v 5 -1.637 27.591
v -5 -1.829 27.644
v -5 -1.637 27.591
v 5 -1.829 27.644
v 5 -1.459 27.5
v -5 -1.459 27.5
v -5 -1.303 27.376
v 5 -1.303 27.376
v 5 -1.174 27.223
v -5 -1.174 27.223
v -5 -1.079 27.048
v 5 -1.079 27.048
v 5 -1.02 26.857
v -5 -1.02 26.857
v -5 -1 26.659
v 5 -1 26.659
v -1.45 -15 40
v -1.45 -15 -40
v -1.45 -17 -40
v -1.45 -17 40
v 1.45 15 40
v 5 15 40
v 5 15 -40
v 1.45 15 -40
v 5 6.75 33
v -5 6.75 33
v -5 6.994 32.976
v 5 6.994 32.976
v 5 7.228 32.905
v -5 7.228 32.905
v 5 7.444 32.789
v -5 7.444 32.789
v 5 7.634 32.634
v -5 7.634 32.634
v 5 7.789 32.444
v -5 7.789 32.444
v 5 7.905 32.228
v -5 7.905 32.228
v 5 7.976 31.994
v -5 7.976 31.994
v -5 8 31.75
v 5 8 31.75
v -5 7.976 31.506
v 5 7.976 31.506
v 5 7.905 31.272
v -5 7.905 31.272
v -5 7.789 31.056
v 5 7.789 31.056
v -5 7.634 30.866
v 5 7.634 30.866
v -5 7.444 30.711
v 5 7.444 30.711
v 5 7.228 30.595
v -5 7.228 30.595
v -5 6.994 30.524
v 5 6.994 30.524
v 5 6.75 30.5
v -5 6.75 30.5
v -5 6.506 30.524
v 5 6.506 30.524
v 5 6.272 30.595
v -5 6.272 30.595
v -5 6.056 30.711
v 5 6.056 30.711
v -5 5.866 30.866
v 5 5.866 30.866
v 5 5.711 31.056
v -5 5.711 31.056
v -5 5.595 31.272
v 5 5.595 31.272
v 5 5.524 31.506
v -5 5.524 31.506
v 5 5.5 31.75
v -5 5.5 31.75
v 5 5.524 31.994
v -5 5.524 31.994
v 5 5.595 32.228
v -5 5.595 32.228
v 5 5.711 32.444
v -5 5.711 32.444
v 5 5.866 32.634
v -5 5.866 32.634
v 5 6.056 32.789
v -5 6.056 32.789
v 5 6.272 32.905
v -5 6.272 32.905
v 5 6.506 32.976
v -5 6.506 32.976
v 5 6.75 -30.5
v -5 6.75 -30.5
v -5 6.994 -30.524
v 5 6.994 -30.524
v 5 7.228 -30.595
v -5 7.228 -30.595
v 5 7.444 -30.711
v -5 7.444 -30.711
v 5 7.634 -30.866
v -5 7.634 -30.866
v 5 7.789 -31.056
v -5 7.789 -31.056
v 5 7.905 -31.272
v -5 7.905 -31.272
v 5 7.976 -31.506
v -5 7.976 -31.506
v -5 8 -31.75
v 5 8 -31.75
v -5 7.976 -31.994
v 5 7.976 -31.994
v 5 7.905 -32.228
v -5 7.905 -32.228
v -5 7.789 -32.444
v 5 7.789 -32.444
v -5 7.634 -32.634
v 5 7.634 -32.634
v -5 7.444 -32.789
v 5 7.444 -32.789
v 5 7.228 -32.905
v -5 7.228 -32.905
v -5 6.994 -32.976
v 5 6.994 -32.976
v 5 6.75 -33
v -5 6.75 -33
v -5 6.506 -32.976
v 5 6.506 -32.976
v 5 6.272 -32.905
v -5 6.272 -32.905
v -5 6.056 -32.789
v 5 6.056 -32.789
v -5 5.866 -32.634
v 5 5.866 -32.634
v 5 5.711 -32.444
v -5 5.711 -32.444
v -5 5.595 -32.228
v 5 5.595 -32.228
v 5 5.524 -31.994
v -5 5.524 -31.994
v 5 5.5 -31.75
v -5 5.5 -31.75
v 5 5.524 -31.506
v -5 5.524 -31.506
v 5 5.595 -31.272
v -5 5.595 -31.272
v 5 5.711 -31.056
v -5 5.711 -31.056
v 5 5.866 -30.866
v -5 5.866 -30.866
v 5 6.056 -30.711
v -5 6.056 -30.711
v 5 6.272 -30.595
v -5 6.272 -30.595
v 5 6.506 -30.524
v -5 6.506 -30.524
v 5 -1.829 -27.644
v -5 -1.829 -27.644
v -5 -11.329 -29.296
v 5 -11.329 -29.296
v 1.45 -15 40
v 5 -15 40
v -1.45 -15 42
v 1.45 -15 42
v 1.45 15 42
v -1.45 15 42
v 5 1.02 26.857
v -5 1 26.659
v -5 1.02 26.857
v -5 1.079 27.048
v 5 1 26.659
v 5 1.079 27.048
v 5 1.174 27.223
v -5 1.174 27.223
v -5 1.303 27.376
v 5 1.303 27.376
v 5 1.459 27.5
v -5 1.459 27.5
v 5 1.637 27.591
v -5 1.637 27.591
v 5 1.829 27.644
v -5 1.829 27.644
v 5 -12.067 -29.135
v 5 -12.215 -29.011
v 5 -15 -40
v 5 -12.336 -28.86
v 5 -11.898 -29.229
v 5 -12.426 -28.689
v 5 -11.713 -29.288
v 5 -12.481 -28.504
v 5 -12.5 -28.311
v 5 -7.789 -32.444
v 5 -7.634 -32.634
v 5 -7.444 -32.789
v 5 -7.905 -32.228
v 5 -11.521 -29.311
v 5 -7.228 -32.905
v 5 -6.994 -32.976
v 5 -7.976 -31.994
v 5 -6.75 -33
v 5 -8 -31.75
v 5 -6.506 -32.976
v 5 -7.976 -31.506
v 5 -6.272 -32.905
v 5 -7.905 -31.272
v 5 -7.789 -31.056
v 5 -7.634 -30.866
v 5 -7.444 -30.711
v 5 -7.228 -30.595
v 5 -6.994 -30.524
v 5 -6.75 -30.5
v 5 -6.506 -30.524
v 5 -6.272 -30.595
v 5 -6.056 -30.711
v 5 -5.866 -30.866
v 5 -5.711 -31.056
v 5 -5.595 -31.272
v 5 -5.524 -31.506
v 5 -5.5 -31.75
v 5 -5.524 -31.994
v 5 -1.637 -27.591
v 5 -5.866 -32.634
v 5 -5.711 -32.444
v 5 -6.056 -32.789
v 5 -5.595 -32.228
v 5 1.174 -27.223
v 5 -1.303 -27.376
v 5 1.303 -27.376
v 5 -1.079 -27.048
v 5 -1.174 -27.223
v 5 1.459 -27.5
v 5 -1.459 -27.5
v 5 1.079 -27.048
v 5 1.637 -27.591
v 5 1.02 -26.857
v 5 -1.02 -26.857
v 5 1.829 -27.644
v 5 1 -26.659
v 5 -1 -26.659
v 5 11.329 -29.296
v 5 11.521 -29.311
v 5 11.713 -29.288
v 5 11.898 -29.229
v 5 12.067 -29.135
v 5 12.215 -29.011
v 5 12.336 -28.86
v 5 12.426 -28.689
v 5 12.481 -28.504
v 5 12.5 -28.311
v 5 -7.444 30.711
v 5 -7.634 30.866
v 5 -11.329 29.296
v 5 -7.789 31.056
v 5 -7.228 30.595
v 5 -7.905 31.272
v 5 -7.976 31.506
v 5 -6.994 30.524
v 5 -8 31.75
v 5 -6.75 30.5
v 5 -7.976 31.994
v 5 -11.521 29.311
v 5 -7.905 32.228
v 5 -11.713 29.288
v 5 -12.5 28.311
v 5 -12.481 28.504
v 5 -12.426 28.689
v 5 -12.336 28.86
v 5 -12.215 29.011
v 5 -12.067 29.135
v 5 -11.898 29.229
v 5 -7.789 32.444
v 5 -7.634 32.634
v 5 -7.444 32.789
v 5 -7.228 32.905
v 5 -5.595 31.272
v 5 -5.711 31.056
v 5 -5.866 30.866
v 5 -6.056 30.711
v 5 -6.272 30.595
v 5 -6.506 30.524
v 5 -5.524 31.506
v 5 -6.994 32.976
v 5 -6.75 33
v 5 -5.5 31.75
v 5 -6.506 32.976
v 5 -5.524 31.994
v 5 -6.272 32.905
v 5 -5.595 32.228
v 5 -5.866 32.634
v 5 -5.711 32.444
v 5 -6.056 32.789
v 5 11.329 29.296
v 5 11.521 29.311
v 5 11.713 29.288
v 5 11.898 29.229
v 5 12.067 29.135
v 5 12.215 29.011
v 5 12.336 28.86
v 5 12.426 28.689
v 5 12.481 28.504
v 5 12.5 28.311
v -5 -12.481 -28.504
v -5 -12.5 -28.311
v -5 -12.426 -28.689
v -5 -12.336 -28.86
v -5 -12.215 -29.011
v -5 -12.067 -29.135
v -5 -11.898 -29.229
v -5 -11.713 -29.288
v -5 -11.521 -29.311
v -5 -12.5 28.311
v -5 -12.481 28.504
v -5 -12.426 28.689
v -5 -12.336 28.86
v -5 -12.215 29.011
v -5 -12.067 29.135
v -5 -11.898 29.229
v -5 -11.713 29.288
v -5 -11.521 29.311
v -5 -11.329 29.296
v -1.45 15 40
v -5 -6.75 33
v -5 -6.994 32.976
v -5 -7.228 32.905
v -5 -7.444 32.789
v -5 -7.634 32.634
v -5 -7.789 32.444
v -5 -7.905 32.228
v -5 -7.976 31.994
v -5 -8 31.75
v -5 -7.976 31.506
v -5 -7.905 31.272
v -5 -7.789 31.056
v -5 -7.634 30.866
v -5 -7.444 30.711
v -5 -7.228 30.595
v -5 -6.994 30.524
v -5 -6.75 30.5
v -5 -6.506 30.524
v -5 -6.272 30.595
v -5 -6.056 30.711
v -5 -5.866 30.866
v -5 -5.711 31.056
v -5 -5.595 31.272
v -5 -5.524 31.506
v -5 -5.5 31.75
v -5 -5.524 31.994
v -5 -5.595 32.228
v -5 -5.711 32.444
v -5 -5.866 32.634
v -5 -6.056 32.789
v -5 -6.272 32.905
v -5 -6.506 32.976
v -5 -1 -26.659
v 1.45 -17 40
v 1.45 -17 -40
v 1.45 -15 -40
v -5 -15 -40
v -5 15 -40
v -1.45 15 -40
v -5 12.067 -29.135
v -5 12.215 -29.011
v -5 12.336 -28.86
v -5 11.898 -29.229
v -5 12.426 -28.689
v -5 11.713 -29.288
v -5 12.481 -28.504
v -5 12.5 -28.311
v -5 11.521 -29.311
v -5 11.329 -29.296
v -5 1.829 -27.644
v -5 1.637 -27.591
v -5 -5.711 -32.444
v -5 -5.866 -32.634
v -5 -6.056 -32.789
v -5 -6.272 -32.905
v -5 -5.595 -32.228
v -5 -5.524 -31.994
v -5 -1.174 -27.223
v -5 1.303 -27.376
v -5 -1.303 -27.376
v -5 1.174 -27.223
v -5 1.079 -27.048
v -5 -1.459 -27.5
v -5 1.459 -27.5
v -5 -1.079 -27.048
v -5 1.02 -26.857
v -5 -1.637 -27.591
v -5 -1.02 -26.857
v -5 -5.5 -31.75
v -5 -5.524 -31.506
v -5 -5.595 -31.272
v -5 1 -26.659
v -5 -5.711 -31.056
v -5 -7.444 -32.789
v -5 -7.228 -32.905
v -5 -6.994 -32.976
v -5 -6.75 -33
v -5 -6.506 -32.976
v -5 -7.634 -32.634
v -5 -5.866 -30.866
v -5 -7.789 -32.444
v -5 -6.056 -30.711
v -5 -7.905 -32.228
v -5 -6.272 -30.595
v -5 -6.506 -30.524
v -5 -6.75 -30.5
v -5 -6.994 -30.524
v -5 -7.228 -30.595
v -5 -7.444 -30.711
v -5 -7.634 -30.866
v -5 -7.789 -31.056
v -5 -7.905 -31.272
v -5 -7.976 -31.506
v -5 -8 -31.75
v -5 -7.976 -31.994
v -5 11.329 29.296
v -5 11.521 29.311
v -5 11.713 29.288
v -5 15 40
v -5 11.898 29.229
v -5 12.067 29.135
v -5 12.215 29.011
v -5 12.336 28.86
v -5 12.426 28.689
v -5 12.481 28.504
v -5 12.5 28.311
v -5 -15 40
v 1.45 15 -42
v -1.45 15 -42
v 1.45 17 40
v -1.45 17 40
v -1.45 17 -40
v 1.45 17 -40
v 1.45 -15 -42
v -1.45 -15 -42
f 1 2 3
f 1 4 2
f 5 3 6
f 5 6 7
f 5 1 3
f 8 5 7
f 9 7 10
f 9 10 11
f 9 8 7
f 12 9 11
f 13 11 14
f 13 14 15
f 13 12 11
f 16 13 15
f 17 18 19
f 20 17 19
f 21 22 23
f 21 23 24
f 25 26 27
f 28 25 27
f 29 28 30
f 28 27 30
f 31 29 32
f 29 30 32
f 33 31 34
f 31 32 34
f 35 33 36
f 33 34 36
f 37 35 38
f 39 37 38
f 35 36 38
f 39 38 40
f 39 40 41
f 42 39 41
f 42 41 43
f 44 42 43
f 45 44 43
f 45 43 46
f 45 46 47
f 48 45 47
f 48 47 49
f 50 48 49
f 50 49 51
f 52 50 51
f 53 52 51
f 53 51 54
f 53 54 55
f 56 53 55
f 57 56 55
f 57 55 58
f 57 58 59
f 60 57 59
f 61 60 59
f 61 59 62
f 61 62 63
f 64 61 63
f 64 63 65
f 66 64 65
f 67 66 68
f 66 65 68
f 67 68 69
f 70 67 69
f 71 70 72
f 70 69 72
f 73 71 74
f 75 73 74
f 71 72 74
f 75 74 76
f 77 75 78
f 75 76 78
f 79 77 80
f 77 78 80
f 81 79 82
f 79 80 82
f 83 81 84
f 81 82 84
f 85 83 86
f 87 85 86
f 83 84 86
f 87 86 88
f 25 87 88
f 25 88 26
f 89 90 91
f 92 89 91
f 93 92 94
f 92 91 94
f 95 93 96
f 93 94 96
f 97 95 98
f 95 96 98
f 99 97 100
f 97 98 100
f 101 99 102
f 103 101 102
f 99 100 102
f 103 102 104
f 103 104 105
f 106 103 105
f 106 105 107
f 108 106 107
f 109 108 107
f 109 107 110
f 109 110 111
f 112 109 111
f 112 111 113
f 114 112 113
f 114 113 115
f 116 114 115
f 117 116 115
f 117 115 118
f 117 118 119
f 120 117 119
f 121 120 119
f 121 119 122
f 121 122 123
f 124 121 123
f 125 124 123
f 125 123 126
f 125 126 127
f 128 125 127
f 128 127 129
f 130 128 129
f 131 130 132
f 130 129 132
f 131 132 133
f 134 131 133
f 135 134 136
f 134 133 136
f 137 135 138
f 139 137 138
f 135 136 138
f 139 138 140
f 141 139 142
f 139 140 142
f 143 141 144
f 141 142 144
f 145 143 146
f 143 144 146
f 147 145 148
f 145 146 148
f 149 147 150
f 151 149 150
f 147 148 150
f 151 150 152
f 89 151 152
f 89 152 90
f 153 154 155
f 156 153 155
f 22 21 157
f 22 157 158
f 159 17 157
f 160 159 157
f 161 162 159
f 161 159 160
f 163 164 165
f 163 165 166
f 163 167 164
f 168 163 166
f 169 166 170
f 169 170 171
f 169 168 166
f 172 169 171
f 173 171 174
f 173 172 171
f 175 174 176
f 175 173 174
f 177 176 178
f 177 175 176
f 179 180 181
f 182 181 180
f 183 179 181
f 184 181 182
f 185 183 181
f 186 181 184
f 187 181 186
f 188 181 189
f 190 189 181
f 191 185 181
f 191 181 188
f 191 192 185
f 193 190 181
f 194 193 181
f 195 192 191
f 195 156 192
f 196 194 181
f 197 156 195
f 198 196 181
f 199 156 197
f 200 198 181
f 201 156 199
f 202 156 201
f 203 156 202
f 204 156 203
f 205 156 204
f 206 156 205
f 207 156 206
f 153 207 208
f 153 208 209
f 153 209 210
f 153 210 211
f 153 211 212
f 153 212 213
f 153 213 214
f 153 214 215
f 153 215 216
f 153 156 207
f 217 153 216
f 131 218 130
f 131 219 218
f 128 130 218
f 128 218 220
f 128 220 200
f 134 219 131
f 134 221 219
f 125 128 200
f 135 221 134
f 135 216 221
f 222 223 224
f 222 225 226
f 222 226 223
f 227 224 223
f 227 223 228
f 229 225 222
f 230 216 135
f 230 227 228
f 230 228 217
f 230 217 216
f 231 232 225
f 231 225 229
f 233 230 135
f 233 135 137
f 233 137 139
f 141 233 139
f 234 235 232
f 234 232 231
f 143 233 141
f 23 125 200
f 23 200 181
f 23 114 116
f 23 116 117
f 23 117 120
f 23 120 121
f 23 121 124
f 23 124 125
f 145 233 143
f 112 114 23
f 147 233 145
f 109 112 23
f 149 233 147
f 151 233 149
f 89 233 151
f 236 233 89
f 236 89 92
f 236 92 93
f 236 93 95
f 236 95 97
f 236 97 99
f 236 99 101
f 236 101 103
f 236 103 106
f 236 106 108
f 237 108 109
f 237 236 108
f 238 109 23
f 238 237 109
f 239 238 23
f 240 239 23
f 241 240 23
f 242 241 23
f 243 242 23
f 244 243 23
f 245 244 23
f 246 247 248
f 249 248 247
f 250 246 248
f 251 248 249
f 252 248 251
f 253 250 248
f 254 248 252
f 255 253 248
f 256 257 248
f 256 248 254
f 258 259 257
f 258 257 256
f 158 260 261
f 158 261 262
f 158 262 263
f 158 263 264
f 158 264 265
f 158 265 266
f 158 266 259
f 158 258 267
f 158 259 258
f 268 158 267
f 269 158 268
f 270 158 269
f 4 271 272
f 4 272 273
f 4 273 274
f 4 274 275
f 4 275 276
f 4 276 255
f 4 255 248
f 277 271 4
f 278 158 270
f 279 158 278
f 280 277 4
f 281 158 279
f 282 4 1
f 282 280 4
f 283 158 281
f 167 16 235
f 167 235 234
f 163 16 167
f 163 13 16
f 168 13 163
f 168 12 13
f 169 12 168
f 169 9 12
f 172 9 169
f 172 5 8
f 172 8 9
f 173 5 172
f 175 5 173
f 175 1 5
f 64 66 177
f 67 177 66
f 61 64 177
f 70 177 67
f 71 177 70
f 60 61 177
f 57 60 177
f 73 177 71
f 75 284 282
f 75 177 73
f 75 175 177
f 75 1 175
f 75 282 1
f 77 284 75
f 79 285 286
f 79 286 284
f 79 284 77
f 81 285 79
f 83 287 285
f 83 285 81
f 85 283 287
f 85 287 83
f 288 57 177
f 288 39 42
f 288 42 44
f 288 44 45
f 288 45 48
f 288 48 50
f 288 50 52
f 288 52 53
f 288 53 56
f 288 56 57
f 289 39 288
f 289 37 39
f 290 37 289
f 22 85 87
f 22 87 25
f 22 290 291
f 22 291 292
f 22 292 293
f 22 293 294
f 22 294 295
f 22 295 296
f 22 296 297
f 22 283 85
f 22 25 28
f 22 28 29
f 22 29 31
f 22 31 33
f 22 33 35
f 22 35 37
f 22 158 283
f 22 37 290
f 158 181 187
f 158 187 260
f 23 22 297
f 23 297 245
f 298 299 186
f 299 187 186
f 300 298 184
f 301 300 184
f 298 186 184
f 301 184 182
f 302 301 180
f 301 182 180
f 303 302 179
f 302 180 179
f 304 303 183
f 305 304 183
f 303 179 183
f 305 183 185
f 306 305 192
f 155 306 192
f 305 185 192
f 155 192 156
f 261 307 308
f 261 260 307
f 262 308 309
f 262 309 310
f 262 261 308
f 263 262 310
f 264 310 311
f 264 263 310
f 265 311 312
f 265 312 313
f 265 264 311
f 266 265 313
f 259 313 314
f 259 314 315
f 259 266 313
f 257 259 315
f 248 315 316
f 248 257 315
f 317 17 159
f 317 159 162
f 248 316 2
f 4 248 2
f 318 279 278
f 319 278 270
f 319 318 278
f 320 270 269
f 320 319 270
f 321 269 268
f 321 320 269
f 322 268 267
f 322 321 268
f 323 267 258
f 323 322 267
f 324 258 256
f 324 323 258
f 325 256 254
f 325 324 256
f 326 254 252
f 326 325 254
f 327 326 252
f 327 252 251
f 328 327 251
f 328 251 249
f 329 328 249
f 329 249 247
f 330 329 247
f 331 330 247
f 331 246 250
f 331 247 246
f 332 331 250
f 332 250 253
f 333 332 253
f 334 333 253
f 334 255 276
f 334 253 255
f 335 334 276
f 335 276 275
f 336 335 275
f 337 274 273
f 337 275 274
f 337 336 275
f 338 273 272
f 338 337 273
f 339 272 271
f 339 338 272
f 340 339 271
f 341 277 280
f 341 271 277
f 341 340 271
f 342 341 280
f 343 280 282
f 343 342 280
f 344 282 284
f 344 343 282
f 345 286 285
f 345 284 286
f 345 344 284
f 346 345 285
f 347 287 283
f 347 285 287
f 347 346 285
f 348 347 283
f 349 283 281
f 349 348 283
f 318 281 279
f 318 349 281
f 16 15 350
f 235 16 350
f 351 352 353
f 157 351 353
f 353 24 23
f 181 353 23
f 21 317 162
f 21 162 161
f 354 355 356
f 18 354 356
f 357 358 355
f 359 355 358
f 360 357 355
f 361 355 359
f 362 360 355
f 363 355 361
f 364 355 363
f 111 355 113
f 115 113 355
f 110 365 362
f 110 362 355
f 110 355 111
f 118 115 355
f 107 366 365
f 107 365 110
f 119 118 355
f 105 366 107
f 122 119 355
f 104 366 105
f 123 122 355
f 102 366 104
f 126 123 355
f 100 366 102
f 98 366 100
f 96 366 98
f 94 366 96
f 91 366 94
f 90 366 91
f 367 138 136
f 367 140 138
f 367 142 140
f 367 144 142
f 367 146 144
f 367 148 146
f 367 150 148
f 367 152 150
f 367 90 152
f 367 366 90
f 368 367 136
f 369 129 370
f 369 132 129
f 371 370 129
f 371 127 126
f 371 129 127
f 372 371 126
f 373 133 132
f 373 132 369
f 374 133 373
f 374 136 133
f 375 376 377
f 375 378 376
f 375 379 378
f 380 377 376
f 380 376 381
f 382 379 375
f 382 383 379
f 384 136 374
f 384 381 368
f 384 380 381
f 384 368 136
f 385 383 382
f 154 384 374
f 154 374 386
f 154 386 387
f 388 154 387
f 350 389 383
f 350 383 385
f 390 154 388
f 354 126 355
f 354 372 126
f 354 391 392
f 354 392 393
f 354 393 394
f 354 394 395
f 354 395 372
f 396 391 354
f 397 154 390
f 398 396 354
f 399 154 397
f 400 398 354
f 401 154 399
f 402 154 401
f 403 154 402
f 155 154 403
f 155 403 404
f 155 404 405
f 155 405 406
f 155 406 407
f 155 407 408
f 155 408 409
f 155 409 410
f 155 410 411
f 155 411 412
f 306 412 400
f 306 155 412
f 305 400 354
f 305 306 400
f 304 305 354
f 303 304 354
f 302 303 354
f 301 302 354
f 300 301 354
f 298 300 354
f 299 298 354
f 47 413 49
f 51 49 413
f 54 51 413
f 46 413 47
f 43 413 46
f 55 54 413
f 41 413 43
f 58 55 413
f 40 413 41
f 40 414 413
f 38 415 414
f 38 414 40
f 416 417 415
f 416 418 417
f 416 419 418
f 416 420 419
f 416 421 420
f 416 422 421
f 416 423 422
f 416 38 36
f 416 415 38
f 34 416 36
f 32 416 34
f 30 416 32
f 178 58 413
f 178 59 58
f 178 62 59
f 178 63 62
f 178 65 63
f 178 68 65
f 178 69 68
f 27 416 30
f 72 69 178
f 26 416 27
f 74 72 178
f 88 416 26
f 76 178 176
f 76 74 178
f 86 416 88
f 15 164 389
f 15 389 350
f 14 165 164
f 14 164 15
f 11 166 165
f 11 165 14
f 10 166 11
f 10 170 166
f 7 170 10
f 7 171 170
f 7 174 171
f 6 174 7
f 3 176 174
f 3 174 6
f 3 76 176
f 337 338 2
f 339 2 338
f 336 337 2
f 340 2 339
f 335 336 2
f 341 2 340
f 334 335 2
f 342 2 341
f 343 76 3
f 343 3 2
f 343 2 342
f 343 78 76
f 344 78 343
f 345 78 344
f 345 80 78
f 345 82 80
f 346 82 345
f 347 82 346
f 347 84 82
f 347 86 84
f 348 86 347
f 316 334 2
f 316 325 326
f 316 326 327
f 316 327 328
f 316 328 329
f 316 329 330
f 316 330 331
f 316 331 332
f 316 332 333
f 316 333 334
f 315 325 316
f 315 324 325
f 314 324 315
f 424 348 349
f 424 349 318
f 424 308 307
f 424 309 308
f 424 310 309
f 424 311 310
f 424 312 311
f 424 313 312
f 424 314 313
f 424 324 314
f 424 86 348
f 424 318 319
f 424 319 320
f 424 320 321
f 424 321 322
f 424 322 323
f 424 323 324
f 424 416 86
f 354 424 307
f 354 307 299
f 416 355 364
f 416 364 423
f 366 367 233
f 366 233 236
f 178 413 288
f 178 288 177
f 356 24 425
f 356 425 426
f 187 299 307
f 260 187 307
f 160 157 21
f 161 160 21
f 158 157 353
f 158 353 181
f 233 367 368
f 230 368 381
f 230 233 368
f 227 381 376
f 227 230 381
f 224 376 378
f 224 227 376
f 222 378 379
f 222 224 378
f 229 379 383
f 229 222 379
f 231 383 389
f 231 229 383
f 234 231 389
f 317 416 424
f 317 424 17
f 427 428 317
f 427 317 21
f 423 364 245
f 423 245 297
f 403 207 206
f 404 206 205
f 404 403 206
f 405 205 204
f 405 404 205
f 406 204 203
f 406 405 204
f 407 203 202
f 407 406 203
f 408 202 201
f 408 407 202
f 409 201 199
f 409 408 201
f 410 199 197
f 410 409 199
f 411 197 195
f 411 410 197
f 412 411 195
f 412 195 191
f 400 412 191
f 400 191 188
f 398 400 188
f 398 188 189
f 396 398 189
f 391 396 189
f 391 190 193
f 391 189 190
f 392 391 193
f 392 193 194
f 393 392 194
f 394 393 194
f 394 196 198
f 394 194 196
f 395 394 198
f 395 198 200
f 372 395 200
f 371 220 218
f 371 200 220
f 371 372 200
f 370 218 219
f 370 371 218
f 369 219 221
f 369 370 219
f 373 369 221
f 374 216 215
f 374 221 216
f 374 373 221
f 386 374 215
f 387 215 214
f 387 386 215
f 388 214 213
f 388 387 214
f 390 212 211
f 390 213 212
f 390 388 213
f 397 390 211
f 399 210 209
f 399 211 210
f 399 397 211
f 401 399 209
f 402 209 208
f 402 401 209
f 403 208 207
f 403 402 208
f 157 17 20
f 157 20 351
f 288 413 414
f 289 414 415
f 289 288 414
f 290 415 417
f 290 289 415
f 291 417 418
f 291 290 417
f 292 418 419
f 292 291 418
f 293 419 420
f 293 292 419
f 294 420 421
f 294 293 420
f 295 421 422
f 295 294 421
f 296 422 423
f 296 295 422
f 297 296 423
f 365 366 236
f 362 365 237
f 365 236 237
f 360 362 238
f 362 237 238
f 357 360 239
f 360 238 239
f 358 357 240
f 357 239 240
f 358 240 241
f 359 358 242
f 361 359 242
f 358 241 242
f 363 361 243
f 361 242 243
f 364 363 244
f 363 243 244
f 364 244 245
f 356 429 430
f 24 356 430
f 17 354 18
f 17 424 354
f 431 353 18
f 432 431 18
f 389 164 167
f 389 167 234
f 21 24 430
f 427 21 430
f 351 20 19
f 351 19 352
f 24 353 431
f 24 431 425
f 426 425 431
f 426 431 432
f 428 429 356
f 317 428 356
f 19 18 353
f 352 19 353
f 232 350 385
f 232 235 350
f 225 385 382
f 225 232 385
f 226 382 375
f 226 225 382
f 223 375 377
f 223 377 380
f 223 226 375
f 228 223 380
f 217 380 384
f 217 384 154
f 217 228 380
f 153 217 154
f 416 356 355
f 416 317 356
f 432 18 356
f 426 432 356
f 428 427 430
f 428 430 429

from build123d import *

# Parameters (mm, degrees)
MAKERBEAMFIX_DEPTH            = 40
SKETCH4_R                     = 1.25
HOLEFORHARTINGCONNECTOR_DEPTH = 11
FILLET1_R                     = 1
FILLET1_OF_MIRROR1_R          = 1
SKETCH5_W                     = 2.9
SKETCH5_H                     = 30
MAKERBEAMFIXLEFT_DEPTH        = 2
SKETCH6_W                     = 2.9
SKETCH6_H                     = 30
MAKERBEAMFIXRIGHT_DEPTH       = 2


with BuildPart() as part:
    # Sketch1 → MakerBeamFix (new body, symmetric)
    with BuildSketch(Plane.XY):
        Polygon((-5, -15), (-1.45, -15), (-1.45, -17), (1.45, -17), (1.45, -15), (5, -15), (5, 15), (1.45, 15), (1.45, 17), (-1.45, 17), (-1.45, 15), (-5, 15), align=None)
    extrude(amount=MAKERBEAMFIX_DEPTH, both=True)

    # Sketch4 → HoleForHartingConnector (cut, through all)
    with BuildSketch(Plane.ZY.offset(5)):
        with Locations((-31.75, 6.75)):
            Circle(SKETCH4_R)
        with Locations((31.75, 6.75)):
            Circle(SKETCH4_R)
        Polygon((-29.5, 12.5), (29.5, 12.5), (27.5, 1), (-27.5, 1), align=None)
    holeforhartingconnector = extrude(amount=-HOLEFORHARTINGCONNECTOR_DEPTH, mode=Mode.SUBTRACT)

    # Fillet1
    fillet1_edges = [part.edges().sort_by_distance(p)[0] for p in [
        (0, 1, -27.5),
        (0, 12.5, -29.5),
        (0, 12.5, 29.5),
        (0, 1, 27.5),
    ]]
    fillet(fillet1_edges, radius=FILLET1_R)

    # Mirror1: HoleForHartingConnector across plane
    add(holeforhartingconnector.mirror(Plane.ZX), mode=Mode.SUBTRACT)

    # Fillet1 of Mirror1
    fillet1_of_mirror1_edges = [part.edges().sort_by_distance(p)[0] for p in [
        (0, -1, -27.5),
        (0, -12.5, -29.5),
        (0, -12.5, 29.5),
        (0, -1, 27.5),
    ]]
    fillet(fillet1_of_mirror1_edges, radius=FILLET1_OF_MIRROR1_R)

    # Sketch5 → MakerBeamFixLeft (add)
    with BuildSketch(Plane.XY.offset(40)):
        Rectangle(SKETCH5_W, SKETCH5_H)
    extrude(amount=MAKERBEAMFIXLEFT_DEPTH)

    # Sketch6 → MakerBeamFixRight (add)
    with BuildSketch(Plane(origin=(0, 0, -40), x_dir=(-1, 0, 0), z_dir=(0, 0, -1))):
        Rectangle(SKETCH6_W, SKETCH6_H)
    extrude(amount=MAKERBEAMFIXRIGHT_DEPTH)


solid = part.part
